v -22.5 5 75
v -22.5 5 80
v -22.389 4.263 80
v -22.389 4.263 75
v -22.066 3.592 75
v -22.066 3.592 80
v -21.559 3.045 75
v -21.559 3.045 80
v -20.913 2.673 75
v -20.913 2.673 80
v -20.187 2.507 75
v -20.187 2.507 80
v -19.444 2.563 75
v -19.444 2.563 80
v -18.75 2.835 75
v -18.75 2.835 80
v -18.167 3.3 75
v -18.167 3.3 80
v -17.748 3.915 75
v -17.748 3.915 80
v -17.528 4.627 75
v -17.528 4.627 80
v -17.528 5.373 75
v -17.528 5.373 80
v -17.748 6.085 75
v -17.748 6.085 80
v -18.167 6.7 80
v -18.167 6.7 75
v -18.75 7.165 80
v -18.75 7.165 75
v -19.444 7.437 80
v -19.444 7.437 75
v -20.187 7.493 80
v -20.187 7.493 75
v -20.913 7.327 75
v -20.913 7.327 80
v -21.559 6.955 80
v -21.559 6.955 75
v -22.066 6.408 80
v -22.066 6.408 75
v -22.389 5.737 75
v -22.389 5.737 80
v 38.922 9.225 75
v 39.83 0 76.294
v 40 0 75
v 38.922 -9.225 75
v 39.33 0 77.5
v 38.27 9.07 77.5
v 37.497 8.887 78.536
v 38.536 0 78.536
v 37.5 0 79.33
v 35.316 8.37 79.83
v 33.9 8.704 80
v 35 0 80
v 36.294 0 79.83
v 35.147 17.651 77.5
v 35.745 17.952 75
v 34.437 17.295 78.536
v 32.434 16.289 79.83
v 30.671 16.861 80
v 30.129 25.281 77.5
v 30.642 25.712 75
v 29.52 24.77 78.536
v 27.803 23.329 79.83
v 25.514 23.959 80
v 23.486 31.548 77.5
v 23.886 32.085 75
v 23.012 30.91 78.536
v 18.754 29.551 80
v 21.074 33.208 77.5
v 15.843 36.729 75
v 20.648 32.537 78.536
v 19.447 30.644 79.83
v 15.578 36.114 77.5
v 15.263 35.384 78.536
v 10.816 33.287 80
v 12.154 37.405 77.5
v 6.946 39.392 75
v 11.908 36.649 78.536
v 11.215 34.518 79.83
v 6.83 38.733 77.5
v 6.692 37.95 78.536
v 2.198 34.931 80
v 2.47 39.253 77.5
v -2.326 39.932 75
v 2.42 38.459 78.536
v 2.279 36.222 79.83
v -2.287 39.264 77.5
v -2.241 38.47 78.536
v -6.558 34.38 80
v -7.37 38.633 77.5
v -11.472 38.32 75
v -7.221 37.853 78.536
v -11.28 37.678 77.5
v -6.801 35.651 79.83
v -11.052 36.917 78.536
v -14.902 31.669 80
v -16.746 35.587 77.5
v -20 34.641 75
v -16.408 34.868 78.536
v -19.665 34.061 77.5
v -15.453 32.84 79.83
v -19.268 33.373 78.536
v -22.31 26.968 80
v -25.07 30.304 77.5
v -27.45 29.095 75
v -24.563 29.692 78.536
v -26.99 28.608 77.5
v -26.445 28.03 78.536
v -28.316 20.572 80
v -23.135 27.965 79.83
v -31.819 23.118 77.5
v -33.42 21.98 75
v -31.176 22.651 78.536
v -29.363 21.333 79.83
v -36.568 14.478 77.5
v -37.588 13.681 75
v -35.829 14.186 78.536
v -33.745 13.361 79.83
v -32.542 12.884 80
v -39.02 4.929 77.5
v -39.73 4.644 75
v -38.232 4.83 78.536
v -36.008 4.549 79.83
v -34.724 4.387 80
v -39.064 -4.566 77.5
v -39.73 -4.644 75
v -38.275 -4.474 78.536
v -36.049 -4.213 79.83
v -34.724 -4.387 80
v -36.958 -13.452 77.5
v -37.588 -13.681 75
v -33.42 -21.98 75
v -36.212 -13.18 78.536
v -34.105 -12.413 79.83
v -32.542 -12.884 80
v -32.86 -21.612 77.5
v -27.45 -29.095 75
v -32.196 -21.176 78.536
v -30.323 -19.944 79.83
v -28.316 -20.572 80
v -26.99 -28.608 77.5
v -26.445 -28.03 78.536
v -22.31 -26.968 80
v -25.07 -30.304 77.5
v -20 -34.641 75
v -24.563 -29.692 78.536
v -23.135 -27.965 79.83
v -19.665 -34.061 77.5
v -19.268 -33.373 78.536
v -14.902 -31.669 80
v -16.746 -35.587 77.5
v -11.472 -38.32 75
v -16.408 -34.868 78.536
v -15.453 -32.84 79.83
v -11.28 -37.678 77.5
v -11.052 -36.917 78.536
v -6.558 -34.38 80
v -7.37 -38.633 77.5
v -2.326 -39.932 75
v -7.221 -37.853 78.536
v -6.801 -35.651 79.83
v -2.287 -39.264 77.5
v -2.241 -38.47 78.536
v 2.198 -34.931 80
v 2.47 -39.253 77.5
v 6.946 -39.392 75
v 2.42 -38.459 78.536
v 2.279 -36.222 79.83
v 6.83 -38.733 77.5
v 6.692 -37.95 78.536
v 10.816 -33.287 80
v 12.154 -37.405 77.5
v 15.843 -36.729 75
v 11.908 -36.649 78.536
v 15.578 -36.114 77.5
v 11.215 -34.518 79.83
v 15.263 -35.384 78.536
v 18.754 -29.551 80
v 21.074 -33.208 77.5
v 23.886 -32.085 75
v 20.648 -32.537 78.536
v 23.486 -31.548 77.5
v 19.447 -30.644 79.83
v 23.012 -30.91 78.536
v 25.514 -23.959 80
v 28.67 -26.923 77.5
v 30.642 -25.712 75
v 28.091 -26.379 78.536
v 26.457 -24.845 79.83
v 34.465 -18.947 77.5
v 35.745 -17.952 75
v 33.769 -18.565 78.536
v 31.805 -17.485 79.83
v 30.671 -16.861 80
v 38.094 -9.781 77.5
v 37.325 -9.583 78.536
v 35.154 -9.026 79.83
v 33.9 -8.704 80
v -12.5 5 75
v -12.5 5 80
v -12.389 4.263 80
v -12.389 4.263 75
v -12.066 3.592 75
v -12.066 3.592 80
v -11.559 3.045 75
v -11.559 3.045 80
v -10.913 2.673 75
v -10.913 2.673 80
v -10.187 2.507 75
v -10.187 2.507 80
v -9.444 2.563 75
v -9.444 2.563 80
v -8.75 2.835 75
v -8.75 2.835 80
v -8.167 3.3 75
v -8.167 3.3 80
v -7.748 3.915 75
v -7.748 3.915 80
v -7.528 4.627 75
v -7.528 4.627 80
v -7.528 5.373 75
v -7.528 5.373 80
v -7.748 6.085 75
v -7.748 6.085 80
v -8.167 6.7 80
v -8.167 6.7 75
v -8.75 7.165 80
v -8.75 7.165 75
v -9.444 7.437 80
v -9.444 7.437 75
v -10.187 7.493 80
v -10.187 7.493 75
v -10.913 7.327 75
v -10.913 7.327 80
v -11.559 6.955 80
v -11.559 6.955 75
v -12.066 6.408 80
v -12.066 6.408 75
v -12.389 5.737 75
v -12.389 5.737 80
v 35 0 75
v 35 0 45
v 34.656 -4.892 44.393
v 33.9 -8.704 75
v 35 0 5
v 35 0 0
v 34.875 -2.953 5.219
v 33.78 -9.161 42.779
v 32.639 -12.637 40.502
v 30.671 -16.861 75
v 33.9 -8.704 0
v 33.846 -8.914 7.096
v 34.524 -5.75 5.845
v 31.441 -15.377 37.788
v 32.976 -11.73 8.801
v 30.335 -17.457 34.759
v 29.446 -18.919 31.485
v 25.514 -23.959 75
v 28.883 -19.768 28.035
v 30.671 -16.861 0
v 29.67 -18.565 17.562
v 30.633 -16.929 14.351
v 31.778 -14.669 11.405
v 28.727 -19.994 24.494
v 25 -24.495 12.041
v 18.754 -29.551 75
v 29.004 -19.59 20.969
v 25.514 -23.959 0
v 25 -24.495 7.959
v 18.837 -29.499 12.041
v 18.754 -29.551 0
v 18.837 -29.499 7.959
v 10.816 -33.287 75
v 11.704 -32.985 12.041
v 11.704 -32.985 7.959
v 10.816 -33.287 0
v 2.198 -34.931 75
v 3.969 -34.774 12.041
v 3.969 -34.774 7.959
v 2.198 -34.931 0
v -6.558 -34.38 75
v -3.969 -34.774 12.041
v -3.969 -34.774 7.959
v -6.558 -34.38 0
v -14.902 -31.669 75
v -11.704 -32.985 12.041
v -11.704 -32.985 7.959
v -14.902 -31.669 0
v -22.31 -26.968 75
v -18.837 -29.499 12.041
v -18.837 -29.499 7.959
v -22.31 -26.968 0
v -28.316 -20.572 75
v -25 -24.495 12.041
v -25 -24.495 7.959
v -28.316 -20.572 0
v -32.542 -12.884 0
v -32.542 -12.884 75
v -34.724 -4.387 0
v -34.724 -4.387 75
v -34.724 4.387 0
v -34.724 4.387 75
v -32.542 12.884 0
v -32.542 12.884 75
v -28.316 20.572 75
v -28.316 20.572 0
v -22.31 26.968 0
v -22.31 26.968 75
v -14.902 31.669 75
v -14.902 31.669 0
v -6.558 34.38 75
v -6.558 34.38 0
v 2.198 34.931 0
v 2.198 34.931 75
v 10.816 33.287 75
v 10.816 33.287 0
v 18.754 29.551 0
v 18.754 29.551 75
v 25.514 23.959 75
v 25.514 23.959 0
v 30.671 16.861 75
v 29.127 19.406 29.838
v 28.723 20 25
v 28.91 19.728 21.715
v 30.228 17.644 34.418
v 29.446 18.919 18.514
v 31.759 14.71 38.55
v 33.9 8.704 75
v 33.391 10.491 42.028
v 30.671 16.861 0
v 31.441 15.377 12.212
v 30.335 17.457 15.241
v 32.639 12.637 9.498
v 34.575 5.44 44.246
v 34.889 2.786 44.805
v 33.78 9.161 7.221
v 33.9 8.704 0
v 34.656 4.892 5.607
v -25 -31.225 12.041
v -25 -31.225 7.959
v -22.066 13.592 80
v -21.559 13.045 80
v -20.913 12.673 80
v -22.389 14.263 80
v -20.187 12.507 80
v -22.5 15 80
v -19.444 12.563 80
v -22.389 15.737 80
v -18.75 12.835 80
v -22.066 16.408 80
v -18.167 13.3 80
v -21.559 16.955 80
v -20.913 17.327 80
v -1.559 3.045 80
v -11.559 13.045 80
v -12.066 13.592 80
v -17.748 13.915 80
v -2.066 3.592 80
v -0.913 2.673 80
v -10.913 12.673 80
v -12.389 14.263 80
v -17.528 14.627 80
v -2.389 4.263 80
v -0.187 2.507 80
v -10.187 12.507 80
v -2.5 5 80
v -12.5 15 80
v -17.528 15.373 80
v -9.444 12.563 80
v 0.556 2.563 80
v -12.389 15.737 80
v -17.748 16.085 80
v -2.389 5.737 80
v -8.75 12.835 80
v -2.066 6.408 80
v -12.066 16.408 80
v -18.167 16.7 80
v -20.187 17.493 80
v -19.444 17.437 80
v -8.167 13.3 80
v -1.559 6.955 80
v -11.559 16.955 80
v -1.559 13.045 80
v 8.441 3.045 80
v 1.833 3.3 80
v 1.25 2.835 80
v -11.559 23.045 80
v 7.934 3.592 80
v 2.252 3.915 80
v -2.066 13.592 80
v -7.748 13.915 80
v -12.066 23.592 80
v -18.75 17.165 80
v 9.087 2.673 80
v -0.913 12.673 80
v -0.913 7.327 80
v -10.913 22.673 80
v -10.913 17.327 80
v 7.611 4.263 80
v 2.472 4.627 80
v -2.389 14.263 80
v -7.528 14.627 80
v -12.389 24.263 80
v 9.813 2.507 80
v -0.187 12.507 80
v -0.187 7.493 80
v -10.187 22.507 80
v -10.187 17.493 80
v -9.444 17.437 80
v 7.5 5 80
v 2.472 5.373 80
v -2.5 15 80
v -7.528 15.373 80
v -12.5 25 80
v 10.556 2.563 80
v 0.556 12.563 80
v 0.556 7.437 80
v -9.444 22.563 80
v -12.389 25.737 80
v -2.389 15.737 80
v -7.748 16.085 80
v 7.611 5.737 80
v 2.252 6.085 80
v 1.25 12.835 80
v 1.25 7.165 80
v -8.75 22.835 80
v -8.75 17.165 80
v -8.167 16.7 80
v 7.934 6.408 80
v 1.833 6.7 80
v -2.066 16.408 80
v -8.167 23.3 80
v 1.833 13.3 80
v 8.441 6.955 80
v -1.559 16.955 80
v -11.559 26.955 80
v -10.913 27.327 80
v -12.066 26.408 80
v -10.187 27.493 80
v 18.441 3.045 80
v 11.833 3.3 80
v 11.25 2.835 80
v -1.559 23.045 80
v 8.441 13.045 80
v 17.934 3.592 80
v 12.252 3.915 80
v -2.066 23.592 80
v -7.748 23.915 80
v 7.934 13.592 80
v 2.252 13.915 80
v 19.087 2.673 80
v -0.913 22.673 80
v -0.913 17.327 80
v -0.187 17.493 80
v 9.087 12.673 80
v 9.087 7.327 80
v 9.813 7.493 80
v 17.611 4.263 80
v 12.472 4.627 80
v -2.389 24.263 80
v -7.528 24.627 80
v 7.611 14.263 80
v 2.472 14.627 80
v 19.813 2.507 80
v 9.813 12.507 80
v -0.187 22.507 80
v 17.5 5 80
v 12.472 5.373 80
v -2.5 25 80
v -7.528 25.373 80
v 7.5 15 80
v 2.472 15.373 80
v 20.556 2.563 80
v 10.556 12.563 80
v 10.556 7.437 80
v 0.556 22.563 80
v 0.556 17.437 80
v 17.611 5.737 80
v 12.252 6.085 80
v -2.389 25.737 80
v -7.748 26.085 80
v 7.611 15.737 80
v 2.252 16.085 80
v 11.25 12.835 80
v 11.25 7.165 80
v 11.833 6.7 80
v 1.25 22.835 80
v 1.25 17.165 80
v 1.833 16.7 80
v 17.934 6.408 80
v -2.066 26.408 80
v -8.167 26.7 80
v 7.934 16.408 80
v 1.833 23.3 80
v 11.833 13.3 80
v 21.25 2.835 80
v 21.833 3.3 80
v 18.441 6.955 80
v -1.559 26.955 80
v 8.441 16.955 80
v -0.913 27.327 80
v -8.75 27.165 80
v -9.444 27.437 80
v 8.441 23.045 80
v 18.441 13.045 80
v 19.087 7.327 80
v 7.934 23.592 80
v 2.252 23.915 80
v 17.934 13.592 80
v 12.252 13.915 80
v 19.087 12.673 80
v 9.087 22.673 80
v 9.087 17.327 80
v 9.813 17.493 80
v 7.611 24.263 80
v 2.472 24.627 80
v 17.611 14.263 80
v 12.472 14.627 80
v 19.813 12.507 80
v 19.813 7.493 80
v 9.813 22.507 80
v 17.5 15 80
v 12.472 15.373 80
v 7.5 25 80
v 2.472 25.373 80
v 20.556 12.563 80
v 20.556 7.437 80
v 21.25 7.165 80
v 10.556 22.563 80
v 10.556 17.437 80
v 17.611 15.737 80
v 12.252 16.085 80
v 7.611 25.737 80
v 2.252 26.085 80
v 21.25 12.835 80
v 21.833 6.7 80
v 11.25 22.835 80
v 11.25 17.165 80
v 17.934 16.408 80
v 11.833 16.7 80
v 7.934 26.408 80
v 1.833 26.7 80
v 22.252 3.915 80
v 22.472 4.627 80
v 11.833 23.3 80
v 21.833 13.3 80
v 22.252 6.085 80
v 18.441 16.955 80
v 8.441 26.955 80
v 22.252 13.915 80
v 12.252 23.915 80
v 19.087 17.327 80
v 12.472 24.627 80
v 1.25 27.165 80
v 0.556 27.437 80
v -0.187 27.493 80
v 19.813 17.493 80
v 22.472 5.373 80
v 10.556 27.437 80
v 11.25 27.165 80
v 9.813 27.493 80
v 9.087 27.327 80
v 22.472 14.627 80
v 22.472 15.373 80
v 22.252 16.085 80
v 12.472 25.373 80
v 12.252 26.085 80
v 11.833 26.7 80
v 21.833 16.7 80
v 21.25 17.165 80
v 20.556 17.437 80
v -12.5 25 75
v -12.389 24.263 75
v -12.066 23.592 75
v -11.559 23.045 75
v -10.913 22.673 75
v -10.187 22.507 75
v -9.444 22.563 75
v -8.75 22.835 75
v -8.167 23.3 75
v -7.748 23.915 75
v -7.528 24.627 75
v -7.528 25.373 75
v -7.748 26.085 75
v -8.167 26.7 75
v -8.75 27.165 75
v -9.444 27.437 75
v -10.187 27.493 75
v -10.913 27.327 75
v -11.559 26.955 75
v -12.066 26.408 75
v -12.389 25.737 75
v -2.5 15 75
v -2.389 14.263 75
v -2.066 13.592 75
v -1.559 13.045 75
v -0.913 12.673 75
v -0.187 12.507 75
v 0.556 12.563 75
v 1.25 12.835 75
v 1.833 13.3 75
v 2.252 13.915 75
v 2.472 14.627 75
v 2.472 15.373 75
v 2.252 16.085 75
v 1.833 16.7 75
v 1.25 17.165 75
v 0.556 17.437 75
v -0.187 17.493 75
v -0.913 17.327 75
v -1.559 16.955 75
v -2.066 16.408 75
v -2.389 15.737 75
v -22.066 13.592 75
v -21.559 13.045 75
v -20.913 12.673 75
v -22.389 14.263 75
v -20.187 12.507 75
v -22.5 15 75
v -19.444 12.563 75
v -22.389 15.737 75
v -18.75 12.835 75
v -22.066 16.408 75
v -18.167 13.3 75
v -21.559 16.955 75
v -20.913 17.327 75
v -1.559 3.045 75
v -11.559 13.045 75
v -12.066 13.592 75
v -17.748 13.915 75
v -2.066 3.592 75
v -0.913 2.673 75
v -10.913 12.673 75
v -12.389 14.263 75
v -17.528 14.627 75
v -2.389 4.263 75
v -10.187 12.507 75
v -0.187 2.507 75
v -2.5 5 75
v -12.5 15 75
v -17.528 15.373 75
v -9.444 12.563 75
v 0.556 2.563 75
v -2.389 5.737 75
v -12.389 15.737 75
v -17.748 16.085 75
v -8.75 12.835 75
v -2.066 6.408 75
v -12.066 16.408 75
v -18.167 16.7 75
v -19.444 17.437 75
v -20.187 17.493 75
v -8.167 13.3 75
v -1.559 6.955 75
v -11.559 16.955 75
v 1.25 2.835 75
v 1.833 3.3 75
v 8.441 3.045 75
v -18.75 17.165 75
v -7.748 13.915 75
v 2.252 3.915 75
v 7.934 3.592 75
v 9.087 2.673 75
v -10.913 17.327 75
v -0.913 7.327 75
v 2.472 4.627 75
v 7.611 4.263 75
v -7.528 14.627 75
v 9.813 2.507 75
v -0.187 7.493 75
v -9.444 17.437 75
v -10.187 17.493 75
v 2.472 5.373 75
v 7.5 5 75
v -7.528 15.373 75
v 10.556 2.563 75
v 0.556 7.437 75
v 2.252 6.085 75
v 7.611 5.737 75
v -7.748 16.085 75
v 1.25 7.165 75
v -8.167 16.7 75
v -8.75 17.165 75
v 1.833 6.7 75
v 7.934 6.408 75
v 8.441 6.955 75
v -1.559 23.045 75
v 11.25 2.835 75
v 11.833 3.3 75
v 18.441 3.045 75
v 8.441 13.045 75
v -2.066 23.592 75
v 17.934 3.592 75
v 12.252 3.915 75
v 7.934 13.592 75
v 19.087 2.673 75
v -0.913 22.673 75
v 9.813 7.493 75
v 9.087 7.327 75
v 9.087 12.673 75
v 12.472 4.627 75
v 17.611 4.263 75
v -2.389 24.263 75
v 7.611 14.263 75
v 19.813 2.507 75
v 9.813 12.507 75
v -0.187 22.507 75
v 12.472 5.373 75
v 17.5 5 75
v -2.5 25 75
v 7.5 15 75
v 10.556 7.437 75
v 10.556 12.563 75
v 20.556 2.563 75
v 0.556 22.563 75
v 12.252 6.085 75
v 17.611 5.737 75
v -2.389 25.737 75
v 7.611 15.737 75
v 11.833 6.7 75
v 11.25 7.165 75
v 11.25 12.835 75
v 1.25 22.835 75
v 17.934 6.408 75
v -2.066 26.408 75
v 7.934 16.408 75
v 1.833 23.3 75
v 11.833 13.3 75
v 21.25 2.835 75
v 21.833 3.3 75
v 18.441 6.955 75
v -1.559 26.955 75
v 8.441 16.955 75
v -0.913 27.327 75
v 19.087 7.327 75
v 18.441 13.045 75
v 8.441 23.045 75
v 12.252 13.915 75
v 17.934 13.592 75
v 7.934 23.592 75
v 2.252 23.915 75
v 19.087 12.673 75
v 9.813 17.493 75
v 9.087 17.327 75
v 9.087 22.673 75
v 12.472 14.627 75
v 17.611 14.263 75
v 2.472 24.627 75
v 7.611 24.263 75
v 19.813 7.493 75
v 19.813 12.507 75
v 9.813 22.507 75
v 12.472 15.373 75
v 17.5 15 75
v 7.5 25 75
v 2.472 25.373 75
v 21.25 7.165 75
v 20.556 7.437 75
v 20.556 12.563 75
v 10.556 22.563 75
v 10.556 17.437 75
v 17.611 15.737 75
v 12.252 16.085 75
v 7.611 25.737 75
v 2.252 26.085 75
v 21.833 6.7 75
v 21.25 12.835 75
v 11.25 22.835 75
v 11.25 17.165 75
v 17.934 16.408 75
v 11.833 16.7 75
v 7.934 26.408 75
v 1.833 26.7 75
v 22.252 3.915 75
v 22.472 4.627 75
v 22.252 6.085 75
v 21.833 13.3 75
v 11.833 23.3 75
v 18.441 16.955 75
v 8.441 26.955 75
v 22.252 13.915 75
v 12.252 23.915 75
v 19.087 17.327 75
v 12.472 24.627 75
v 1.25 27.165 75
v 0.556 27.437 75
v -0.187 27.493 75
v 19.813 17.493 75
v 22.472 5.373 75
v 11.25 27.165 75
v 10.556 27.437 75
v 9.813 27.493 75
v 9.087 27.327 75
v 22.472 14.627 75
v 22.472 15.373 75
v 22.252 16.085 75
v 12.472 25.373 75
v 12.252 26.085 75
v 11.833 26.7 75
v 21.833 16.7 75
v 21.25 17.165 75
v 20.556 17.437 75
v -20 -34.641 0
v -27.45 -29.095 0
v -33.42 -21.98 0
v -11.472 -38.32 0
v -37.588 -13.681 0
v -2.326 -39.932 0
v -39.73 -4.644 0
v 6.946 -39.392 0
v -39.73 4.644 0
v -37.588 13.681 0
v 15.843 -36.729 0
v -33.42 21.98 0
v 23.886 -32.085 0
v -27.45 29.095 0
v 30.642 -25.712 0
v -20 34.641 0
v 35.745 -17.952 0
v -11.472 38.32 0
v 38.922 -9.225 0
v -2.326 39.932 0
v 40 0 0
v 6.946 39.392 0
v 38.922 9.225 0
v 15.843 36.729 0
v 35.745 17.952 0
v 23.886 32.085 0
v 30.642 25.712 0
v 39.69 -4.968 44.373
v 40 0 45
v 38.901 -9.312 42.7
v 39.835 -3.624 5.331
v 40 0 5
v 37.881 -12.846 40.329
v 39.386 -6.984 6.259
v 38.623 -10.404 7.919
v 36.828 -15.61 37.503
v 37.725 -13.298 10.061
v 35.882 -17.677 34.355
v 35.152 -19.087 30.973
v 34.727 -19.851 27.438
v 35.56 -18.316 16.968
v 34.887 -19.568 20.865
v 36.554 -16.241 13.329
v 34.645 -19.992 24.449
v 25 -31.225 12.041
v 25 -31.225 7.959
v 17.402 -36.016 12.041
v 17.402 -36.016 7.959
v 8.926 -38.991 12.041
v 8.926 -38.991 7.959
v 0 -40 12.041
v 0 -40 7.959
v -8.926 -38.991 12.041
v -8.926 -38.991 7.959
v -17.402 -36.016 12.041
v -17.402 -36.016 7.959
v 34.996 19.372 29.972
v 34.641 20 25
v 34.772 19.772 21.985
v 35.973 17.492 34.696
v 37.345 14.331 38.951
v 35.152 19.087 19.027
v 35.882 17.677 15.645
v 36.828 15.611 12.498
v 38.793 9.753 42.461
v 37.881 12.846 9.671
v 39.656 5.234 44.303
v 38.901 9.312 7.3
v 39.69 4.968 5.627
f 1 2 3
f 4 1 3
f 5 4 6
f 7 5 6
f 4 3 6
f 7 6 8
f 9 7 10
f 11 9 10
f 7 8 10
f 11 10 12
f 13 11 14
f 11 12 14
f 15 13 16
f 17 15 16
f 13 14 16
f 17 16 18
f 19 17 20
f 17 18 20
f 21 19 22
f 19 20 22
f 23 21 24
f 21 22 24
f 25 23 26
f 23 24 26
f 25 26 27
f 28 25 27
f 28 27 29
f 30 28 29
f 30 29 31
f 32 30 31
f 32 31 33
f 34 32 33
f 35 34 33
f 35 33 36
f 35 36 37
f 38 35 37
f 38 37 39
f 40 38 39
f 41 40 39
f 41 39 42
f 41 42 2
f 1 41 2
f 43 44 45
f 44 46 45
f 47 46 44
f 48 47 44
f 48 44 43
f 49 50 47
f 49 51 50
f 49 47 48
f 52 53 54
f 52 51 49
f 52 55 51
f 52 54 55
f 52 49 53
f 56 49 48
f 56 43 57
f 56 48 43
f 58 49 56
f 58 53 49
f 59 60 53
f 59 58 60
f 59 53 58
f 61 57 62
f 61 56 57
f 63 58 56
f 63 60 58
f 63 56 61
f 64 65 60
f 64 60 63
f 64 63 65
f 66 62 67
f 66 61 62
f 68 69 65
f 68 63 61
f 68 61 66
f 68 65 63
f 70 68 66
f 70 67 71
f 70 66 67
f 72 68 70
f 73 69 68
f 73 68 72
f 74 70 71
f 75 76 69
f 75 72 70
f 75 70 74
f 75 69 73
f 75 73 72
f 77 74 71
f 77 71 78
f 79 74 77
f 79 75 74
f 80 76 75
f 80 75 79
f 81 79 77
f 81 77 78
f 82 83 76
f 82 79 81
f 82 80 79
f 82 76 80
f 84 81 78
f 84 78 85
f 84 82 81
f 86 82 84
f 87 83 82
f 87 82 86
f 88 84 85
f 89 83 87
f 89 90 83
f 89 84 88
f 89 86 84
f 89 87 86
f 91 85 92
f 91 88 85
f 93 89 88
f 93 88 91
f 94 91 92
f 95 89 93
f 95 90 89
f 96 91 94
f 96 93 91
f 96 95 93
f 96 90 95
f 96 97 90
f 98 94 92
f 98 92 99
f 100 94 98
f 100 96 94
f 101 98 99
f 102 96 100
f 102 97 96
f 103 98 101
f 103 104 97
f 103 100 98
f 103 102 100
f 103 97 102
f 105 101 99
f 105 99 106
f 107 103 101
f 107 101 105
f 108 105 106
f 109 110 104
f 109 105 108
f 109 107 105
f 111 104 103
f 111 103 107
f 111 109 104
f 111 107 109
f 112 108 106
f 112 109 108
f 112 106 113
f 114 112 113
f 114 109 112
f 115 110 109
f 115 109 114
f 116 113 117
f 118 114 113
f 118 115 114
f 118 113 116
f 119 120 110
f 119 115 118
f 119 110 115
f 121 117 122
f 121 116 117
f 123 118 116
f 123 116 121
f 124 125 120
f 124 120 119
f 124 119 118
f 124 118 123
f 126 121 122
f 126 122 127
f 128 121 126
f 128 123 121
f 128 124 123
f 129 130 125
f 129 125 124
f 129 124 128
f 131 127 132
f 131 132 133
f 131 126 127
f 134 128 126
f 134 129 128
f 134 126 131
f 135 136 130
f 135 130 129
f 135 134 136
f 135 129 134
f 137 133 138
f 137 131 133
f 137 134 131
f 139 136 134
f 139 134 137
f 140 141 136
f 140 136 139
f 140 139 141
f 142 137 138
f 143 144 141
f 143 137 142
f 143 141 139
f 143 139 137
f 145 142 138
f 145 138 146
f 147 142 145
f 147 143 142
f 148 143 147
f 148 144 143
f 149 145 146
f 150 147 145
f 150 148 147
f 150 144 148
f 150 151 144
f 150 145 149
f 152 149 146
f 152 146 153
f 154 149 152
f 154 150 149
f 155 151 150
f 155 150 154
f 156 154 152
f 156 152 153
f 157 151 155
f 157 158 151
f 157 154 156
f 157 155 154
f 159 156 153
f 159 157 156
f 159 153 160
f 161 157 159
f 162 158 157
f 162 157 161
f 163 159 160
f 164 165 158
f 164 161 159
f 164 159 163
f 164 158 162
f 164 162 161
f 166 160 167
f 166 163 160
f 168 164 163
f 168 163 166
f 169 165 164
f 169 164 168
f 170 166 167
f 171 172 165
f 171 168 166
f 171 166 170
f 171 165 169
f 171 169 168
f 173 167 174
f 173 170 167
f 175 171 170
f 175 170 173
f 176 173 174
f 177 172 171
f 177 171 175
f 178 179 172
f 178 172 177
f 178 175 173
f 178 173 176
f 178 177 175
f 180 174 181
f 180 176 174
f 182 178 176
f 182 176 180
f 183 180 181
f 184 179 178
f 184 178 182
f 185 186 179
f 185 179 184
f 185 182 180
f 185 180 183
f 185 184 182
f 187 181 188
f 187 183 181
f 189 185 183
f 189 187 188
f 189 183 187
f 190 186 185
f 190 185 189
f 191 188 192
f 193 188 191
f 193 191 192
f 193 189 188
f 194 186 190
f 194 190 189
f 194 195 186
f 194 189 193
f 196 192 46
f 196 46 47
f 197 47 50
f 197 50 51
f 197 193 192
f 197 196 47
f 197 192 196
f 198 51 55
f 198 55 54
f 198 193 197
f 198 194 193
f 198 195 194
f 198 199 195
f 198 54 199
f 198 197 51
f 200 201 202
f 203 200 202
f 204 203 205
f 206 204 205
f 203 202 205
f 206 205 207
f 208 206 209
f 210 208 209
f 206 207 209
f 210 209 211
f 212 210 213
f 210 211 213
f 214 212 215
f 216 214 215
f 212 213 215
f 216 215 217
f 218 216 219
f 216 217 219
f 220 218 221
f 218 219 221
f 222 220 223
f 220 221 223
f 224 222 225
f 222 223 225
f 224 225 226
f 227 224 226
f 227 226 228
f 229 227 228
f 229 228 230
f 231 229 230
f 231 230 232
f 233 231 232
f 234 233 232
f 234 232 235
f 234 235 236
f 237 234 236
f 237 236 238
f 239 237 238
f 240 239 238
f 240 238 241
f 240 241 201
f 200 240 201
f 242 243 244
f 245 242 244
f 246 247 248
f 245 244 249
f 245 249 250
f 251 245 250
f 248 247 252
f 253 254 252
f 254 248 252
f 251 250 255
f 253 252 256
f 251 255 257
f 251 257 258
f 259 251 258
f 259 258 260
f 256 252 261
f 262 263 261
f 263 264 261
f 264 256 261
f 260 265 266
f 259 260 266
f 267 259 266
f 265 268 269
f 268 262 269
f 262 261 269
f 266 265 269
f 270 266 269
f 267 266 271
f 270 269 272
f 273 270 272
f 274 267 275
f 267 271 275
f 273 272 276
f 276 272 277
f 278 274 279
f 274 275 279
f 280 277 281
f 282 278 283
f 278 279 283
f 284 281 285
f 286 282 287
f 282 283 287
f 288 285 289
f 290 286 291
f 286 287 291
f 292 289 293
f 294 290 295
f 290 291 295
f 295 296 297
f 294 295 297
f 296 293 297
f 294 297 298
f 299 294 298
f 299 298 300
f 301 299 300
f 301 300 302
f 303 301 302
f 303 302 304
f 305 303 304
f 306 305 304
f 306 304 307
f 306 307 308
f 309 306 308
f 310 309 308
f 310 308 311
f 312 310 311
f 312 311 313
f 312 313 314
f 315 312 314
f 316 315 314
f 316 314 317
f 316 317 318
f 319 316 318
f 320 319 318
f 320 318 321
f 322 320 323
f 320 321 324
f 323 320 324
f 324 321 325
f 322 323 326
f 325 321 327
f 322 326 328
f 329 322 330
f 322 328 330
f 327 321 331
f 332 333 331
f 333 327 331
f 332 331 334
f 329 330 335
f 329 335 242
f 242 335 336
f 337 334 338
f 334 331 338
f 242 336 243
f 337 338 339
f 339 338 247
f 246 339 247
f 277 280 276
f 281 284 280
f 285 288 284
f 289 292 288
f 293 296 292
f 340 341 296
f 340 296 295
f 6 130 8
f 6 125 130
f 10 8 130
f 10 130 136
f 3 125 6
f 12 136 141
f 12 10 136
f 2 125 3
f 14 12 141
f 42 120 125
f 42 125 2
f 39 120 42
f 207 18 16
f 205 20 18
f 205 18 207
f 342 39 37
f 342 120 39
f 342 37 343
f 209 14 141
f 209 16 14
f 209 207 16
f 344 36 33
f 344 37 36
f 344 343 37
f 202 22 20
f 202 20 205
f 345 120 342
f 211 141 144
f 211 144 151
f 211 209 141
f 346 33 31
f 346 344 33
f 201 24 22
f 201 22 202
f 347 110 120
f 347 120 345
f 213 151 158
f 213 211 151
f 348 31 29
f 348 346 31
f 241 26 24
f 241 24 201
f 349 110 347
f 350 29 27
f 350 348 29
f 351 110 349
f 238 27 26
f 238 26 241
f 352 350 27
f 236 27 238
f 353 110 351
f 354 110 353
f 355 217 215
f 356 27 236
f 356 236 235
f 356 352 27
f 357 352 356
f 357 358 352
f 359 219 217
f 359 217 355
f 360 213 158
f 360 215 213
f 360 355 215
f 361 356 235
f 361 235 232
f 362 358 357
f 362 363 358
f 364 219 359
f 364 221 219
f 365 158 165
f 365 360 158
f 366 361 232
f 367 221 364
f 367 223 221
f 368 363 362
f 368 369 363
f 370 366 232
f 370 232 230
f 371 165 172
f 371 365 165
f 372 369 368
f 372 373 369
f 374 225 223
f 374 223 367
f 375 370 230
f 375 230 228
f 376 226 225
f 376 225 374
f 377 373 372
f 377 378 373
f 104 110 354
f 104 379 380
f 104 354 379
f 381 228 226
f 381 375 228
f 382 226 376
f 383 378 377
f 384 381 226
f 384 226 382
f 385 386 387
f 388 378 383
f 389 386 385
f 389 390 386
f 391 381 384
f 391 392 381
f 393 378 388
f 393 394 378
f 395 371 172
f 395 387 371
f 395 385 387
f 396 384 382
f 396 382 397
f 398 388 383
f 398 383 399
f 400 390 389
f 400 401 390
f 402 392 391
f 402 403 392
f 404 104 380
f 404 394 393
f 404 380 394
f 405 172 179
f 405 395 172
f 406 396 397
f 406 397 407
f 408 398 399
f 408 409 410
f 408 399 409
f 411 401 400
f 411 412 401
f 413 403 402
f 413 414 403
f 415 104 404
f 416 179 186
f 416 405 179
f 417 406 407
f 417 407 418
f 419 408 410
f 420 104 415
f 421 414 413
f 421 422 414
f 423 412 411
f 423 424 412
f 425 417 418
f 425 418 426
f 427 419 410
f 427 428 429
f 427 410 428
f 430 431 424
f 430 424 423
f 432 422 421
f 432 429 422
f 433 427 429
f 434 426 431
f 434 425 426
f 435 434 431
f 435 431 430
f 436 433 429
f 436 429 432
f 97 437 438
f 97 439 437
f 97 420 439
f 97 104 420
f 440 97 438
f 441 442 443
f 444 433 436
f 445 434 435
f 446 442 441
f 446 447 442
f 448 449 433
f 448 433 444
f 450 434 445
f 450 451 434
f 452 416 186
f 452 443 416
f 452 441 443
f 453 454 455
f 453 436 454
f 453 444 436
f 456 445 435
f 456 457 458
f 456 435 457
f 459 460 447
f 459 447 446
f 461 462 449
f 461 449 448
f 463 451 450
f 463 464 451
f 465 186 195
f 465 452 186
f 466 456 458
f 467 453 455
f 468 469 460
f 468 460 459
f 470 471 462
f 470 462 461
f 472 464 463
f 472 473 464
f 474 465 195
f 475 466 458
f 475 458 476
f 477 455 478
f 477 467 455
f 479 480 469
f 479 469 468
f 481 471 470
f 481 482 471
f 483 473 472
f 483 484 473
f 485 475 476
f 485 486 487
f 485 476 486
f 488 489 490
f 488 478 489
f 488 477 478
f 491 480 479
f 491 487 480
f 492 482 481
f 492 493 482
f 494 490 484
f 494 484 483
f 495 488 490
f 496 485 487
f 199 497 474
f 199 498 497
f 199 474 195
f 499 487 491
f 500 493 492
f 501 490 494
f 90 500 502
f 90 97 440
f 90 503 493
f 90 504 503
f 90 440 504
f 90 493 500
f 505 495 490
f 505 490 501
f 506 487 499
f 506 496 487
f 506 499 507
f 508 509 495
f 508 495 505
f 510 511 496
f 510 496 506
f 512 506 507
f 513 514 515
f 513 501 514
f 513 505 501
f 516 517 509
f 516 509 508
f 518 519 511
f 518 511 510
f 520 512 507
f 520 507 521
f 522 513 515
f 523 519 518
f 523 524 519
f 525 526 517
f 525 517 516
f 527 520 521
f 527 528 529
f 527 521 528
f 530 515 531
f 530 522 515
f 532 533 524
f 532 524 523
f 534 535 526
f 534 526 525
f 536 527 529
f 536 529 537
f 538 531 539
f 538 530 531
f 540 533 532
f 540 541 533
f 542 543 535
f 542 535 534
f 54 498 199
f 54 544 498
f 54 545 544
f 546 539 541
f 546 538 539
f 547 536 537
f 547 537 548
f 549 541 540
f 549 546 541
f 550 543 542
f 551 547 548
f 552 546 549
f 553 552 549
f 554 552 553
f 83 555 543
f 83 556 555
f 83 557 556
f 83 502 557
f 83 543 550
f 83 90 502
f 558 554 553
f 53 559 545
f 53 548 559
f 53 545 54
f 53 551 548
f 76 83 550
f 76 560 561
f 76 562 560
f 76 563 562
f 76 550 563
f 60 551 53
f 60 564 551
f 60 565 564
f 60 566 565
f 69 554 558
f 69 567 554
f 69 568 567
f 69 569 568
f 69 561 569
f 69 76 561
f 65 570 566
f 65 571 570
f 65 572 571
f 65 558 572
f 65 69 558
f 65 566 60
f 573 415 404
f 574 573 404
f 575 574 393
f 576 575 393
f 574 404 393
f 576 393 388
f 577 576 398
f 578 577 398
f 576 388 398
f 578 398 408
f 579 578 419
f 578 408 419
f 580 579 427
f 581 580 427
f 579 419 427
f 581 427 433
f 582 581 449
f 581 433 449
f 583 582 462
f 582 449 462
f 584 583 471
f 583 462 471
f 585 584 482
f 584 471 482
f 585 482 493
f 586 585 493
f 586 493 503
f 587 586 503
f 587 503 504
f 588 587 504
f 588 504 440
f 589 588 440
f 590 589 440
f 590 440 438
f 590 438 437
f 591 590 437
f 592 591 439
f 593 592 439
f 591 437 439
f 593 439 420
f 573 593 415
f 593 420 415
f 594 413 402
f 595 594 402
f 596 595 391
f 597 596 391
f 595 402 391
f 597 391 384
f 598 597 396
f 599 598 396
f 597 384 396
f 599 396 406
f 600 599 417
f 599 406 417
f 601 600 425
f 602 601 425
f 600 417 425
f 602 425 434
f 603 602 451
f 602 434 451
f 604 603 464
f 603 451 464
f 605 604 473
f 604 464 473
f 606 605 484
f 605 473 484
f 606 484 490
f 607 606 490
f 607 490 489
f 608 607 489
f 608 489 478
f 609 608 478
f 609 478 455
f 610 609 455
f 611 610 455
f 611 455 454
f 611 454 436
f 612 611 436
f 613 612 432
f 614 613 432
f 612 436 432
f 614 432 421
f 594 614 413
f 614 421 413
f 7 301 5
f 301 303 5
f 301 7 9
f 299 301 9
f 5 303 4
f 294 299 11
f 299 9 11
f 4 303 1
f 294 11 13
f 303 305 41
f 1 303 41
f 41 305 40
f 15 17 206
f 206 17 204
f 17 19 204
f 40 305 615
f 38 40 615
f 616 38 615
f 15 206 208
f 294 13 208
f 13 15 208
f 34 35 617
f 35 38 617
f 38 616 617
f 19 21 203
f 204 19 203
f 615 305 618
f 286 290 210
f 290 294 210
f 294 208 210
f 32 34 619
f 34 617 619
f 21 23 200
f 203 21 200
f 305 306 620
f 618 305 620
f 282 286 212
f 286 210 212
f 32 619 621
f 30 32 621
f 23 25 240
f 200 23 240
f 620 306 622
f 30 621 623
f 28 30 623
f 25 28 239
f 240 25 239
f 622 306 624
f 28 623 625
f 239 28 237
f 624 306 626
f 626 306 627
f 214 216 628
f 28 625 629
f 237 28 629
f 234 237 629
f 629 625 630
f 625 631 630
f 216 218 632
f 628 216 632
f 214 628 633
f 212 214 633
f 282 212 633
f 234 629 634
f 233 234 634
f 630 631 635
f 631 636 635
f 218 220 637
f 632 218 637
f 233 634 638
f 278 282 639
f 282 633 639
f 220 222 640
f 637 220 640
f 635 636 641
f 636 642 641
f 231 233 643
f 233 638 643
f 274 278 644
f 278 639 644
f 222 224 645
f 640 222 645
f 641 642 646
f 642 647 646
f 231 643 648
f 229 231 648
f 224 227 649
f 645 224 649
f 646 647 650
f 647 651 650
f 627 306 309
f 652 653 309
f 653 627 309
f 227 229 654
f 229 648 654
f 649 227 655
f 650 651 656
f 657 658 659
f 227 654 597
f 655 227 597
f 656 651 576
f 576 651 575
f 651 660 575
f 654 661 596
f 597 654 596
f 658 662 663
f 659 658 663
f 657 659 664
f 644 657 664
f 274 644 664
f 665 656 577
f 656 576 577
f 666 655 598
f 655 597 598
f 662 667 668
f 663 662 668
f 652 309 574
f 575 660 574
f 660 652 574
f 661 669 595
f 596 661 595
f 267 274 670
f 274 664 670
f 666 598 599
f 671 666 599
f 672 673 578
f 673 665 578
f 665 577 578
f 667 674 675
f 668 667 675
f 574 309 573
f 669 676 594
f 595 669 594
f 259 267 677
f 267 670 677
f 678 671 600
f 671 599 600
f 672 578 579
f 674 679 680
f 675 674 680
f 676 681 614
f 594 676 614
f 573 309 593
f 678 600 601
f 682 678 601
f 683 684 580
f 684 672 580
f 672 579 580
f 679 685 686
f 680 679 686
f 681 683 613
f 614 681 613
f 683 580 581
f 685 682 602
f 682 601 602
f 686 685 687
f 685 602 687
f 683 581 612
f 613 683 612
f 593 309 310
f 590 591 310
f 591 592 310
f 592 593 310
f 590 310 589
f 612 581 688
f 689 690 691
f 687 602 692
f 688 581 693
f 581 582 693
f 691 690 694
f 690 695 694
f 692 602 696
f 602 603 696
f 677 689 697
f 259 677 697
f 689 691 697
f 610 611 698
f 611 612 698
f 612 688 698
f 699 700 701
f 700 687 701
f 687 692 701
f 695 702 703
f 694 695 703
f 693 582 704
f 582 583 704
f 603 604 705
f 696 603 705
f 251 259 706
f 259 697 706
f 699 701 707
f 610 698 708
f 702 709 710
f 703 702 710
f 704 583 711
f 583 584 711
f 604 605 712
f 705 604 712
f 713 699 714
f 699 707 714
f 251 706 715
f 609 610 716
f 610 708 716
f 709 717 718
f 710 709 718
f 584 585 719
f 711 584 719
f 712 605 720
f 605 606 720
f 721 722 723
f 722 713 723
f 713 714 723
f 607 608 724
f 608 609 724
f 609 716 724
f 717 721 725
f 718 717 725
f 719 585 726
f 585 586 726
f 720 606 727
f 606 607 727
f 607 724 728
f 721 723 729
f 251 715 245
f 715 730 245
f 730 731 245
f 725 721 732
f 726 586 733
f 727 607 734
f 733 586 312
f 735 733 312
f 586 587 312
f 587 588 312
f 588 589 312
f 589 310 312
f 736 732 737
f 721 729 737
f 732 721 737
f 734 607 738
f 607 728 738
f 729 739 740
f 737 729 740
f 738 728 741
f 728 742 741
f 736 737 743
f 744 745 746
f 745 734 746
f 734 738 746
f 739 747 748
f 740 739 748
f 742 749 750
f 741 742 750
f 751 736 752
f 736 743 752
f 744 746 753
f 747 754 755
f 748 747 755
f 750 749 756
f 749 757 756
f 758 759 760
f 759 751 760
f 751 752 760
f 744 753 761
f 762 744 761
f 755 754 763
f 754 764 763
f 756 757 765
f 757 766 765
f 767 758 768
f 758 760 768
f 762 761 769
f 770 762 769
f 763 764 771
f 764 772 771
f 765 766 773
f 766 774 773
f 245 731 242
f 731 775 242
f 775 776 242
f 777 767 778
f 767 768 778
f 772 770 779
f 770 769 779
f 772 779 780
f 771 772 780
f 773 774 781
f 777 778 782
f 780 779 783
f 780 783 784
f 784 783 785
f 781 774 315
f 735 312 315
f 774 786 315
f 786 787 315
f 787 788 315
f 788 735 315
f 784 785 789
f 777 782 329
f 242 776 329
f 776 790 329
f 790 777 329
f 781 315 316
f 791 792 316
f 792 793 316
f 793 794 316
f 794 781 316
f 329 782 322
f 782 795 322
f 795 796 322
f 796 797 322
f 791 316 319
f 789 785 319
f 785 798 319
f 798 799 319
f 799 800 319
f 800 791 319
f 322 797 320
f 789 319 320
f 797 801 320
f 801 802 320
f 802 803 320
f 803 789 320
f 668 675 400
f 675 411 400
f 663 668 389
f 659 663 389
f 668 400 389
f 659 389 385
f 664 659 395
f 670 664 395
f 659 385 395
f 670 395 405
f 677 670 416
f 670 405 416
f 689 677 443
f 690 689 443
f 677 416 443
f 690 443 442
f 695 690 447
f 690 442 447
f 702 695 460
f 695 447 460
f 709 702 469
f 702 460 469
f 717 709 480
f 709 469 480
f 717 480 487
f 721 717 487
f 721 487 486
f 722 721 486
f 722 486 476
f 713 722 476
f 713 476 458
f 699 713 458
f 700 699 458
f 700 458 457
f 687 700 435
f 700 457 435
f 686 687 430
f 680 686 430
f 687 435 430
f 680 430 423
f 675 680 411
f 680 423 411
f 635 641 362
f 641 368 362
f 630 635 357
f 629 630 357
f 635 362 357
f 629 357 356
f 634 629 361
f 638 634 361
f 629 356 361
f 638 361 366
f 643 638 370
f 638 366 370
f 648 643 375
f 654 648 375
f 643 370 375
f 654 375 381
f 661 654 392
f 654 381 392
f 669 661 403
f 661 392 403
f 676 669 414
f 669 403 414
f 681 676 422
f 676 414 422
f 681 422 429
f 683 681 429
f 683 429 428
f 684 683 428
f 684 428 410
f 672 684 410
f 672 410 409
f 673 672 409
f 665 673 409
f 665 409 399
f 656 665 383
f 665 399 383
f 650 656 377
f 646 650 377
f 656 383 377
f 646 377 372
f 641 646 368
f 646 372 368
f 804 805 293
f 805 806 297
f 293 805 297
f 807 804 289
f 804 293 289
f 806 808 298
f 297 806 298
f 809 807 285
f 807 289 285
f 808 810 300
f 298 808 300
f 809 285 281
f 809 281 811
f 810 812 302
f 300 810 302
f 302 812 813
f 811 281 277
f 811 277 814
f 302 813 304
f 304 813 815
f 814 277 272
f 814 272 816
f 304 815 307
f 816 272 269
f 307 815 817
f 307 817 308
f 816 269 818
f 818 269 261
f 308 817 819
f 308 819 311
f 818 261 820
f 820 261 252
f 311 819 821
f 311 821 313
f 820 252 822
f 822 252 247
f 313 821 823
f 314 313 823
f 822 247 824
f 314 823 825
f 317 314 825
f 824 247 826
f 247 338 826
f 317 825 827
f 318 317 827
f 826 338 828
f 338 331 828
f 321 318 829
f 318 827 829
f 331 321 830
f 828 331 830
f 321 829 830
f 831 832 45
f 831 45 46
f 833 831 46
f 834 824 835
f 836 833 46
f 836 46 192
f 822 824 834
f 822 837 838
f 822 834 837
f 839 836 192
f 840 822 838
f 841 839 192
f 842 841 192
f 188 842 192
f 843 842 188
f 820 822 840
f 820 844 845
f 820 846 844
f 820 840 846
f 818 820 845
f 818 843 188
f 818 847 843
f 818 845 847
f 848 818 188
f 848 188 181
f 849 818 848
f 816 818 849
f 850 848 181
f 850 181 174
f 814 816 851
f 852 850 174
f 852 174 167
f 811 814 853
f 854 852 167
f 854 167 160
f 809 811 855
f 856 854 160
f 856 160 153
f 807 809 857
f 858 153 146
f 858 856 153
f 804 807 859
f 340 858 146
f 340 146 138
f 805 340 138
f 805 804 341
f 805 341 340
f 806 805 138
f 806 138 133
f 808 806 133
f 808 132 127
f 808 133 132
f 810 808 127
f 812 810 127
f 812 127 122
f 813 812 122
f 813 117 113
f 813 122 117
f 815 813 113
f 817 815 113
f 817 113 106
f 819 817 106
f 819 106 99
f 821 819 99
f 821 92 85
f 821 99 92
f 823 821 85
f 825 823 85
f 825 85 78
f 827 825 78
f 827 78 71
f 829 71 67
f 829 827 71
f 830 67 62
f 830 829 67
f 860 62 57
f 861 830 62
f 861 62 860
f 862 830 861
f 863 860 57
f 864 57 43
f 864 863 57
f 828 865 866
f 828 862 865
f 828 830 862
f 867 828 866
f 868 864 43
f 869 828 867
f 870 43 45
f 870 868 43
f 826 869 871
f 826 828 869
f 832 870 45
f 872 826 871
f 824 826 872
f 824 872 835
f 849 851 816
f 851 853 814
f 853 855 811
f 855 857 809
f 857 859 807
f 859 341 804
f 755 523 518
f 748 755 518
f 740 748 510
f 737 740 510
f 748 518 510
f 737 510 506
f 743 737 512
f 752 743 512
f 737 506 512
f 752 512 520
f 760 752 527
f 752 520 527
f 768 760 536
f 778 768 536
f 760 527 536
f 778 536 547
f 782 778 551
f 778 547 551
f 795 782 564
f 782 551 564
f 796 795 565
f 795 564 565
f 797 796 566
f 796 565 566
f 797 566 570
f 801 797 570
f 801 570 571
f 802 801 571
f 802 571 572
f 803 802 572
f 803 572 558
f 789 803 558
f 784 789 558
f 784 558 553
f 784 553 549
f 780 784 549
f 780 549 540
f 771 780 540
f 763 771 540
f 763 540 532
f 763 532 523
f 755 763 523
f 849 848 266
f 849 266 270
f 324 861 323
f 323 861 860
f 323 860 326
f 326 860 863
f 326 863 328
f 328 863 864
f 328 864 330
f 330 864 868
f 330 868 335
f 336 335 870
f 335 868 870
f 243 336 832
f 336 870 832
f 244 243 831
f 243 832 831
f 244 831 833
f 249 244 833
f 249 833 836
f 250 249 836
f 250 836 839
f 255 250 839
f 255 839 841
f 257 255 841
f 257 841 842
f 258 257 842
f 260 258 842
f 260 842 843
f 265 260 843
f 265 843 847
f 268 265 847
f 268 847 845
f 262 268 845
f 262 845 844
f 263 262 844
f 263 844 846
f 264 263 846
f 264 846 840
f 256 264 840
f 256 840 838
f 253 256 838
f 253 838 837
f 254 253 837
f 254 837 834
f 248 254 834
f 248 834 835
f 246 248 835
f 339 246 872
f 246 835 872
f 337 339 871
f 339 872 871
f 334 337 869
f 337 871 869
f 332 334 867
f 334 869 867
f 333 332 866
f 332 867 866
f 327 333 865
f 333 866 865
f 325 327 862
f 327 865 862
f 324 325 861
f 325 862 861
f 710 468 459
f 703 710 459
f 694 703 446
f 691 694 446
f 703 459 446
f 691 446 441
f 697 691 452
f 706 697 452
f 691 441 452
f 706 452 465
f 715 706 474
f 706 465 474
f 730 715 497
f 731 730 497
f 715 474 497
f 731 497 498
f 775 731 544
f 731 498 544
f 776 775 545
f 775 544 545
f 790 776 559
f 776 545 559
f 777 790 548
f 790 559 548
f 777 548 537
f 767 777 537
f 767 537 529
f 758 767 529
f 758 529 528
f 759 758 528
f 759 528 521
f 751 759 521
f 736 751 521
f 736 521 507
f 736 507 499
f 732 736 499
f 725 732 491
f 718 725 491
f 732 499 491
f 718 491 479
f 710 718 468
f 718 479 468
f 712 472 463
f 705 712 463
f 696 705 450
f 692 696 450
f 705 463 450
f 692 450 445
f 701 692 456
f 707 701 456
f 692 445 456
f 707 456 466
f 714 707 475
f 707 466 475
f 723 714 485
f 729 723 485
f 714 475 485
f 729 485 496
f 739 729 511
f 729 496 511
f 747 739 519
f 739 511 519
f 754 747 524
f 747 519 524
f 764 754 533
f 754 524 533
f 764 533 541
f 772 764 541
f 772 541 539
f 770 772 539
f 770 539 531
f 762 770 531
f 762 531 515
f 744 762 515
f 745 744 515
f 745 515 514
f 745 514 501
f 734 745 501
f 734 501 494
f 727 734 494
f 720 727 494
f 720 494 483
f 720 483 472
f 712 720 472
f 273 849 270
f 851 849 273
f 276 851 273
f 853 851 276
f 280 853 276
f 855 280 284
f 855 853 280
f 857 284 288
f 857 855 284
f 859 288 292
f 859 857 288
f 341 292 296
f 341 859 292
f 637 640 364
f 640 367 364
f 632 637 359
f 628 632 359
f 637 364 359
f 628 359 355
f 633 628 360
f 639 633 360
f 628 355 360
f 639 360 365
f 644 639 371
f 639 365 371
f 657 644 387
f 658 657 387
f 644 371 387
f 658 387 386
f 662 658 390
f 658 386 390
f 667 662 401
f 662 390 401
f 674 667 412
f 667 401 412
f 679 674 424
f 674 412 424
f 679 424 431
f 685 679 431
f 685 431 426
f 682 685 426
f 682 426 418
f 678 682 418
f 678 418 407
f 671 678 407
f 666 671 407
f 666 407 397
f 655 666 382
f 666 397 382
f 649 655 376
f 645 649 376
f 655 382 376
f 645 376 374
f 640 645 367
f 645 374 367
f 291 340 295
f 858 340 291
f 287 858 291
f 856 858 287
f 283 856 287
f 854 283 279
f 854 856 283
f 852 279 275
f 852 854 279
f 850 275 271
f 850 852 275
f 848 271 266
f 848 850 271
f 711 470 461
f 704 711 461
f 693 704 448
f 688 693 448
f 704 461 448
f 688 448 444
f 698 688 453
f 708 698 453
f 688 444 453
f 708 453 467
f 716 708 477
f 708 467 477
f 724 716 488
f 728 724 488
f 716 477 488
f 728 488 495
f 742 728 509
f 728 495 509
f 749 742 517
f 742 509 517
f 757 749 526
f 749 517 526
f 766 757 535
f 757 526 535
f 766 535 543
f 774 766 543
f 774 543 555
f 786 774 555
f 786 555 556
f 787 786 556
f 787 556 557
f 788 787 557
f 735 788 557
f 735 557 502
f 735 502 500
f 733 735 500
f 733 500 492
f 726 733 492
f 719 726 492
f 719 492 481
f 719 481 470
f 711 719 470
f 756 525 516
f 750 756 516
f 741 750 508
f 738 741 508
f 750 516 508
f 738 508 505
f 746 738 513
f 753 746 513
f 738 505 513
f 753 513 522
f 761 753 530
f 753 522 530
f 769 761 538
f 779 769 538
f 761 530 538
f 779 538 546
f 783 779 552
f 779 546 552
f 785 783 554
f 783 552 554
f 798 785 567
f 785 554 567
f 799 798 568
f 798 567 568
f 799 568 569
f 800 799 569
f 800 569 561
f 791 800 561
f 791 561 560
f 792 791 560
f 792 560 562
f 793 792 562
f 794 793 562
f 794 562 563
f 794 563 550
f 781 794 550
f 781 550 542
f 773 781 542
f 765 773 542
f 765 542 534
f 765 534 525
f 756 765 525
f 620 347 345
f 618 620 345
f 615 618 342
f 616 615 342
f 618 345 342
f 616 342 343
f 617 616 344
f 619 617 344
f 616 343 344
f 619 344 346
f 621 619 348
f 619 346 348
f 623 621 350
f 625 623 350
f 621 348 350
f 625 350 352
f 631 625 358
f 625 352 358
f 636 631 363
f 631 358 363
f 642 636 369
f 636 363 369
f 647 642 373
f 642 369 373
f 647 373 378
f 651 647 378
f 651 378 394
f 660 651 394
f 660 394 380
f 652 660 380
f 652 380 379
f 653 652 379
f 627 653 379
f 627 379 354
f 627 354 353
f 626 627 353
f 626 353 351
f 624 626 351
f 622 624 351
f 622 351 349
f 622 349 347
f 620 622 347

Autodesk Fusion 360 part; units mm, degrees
sketch "スケッチ1" plane through (0, 0, 0) normal (0, 0, 1) x (1, 0, 0)
  circle A0 centre (0, 0) radius 40
extrude "押し出し1" add sketch "スケッチ1" along normal blind 80
shell "シェル1" thickness 5 removed faces 1 at (9.4847, -14.2223, 0)
fillet "フィレット1" radius 5 1 edges at (-37.2931, -14.4646, 80)
ref_plane "作業平面1" through (45, 0, 0) normal (1, 0, 0) x (0, 1, 0)
sketch "スケッチ2" plane through (45, 0, 0) normal (1, 0, 0) x (0, 1, 0)
  circle A0 centre (0, 25) radius 20
extrude "押し出し2" cut sketch "スケッチ2" against normal blind 25
sketch "スケッチ3" plane through (0, 0, 80) normal (0, 0, 1) x (-1, 0, 0)
  circle A0 centre (0, 0) radius 35
  circle A1 centre (10, -25) radius 2.5
  circle A2 centre (0, -25) radius 2.5
  circle A3 centre (-10, -25) radius 2.5
  circle A4 centre (10, -15) radius 2.5
  circle A5 centre (0, -15) radius 2.5
  circle A6 centre (-10, -15) radius 2.5
  circle A7 centre (-20, -15) radius 2.5
  circle A8 centre (20, -15) radius 2.5
  circle A9 centre (0, -5) radius 2.5
  circle A10 centre (-10, -5) radius 2.5
  circle A11 centre (-20, -5) radius 2.5
  circle A12 centre (10, -5) radius 2.5
  circle A13 centre (20, -5) radius 2.5
  dimension "d9" = 5
  dimension "d10" = 5
  dimension "d11" = 5
  dimension "d12" = 5
  dimension "d13" = 5
  dimension "d14" = 5
  dimension "d15" = 5
  dimension "d16" = 5
  dimension "d17" = 5
  dimension "d18" = 5
  dimension "d19" = 5
  dimension "d20" = 5
  dimension "d21" = 5
extrude "押し出し3" cut sketch "スケッチ3" against normal blind 8 contours A1 | A2 | A3 | A4 | A5 | A6 | A7 | A8 | A9 | A10 | A11 | A12 | A13
ref_plane "作業平面2" through (0, -45, 0) normal (0, 1, 0) x (0, 0, 1)
sketch "スケッチ4" plane through (0, -45, 0) normal (0, 1, 0) x (1, 0, 0)
  line L0 (-25, -12.0407) -> (25, -12.0407)
  line L1 (25, -12.0407) -> (25, -7.9593)
  line L2 (25, -7.9593) -> (-25, -7.9593)
  line L3 (-25, -7.9593) -> (-25, -12.0407)
  line L4 (-25, -12.0407) -> (25, -7.9593) construction
  line L5 (25, -12.0407) -> (-25, -7.9593) construction
  point P0 (0, -10)
  dimension "d25" = 50
extrude "押し出し4" cut sketch "スケッチ4" along normal blind 30
